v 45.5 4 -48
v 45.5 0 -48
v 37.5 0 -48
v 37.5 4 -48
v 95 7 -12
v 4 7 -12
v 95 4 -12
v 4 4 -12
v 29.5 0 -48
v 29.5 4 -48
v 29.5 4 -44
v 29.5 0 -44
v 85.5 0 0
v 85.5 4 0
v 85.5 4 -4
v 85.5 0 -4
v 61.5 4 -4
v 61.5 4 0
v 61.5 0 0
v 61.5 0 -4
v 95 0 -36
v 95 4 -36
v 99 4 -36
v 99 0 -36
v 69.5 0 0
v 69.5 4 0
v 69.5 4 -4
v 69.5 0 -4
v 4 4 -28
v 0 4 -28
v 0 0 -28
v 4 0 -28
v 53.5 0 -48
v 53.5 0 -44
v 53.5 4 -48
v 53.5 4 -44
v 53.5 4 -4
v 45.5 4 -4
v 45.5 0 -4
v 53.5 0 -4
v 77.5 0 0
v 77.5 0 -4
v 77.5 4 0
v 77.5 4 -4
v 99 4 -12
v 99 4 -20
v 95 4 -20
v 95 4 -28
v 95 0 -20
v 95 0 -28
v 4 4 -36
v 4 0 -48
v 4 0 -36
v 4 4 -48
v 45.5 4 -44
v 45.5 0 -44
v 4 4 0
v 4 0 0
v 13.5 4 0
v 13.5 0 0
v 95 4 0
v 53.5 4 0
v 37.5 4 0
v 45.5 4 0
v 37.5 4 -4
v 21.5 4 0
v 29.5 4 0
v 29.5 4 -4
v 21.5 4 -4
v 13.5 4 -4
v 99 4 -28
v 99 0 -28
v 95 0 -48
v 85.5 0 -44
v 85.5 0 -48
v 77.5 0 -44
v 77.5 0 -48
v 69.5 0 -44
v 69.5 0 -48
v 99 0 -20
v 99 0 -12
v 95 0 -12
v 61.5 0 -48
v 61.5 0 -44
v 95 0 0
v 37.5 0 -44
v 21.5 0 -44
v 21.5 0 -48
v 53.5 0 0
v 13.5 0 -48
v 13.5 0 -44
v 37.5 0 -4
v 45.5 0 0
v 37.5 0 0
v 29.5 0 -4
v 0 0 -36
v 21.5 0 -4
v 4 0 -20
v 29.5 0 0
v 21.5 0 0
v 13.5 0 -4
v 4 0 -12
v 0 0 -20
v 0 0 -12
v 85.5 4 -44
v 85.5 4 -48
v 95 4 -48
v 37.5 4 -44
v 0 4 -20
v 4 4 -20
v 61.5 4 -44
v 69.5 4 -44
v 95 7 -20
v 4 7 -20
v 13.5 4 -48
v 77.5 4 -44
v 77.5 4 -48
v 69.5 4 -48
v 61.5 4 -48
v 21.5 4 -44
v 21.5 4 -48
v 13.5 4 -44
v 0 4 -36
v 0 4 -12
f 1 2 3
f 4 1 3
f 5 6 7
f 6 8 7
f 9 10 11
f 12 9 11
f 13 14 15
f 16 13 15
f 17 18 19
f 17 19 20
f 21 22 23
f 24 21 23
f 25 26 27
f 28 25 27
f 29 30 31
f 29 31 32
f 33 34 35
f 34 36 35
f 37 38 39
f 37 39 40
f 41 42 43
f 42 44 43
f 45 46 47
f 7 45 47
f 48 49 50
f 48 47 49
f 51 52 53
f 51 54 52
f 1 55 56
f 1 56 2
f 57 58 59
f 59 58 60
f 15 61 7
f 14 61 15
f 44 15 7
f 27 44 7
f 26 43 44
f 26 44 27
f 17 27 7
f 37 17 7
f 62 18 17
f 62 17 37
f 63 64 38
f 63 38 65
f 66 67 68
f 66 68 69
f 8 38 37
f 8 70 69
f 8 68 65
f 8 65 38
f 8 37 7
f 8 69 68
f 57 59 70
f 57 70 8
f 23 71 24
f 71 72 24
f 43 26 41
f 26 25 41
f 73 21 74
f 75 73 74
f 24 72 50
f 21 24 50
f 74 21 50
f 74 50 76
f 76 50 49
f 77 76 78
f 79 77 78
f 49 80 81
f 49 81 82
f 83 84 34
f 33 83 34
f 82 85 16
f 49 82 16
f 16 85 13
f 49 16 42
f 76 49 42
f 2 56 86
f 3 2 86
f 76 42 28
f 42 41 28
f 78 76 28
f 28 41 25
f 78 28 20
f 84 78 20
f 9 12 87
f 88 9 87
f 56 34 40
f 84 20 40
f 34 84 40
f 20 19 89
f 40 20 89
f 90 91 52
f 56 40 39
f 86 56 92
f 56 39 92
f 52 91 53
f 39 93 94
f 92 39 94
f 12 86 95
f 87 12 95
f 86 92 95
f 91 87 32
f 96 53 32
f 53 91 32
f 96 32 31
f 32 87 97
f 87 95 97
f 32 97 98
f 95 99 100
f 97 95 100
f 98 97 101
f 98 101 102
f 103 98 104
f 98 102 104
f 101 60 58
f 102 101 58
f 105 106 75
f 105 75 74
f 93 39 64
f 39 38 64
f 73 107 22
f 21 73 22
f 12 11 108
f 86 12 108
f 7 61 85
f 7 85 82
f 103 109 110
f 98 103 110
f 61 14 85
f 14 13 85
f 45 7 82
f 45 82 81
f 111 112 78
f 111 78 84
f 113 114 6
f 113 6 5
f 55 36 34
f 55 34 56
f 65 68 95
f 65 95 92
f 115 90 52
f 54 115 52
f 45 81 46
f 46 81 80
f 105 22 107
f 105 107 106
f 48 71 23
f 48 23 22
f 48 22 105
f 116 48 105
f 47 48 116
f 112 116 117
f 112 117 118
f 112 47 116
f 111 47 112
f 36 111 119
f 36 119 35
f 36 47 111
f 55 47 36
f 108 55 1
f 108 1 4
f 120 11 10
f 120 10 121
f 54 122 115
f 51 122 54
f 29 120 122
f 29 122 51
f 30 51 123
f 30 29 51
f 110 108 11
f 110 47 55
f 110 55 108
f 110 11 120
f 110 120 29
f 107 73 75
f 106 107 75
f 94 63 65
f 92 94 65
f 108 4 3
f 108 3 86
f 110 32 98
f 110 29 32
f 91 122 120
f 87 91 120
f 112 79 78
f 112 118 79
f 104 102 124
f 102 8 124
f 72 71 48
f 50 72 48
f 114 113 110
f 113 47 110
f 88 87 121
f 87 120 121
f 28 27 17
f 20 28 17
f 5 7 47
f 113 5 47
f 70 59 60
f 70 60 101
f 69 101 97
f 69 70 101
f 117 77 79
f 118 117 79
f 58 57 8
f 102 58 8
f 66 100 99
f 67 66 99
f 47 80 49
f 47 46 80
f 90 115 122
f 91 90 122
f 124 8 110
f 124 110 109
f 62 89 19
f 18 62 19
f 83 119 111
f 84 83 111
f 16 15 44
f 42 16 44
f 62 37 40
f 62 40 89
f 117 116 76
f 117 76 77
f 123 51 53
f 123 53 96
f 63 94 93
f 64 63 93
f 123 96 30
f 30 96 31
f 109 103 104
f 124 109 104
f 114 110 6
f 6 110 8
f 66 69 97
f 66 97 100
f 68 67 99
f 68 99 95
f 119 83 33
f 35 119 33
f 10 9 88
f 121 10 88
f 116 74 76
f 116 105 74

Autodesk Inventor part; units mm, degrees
ref_plane "YZ Plane" through (0, 0, 0) normal (1, 0, 0) x (0, 1, 0)
ref_plane "XZ Plane" through (0, 0, 0) normal (0, 1, 0) x (-1, 0, 0)
ref_plane "XY Plane" through (0, 0, 0) normal (0, 0, 1) x (1, 0, 0)
sketch "Sketch1" plane through (0, 0, 0) normal (0, 1, 0) x (-1, 0, 0)
  line L0 (0, 0) -> (-99, 0)
  line L1 (-99, 0) -> (-99, -48)
  line L2 (-99, -48) -> (0, -48)
  line L3 (0, -48) -> (0, 0)
  dimension "d0" = 99
  dimension "d1" = 48
extrude "Extrusion1" add sketch "Sketch1" along normal blind 4
sketch "Sketch2" plane through (0, 4, 0) normal (0, 1, 0) x (1, 0, 0)
  line L0 (99, 48) -> (0, 48) construction
  line L1 (99, 0) -> (99, 48) construction
  line L2 (0, 0) -> (99, 0) construction
  line L3 (0, 48) -> (0, 0) construction
  line L4 (4, 44) -> (95, 44) construction
  line L5 (95, 44) -> (95, 4) construction
  line L6 (95, 4) -> (4, 4) construction
  line L7 (4, 4) -> (4, 44) construction
  line L8 (4, 36) -> (0, 36)
  line L9 (0, 36) -> (0, 48)
  line L10 (0, 48) -> (4, 48)
  line L11 (4, 48) -> (4, 36)
  line L12 (0, 24) -> (99, 24) construction
  line L13 (49.5, 0) -> (49.5, 48) construction
  line L14 (0, 28) -> (4, 28)
  line L15 (0, 28) -> (0, 24)
  line L16 (4, 28) -> (4, 24)
  line L17 (13.5, 48) -> (13.5, 44)
  line L18 (13.5, 44) -> (21.5, 44)
  line L19 (21.5, 44) -> (21.5, 48)
  line L20 (21.5, 48) -> (13.5, 48)
  line L21 (29.5, 48) -> (29.5, 44)
  line L22 (29.5, 44) -> (37.5, 44)
  line L23 (37.5, 48) -> (37.5, 44)
  line L24 (37.5, 48) -> (29.5, 48)
  line L25 (45.5, 44) -> (45.5, 48)
  line L26 (45.5, 44) -> (49.5, 44)
  line L27 (49.5, 48) -> (45.5, 48)
  line L28 (4, 12) -> (0, 12)
  line L29 (0, 12) -> (0, 0)
  line L30 (0, 0) -> (4, 0)
  line L31 (4, 0) -> (4, 12)
  line L32 (0, 20) -> (4, 20)
  line L33 (0, 20) -> (0, 24)
  line L34 (4, 20) -> (4, 24)
  line L35 (13.5, 0) -> (13.5, 4)
  line L36 (13.5, 4) -> (21.5, 4)
  line L37 (21.5, 4) -> (21.5, 0)
  line L38 (21.5, 0) -> (13.5, 0)
  line L39 (29.5, 0) -> (29.5, 4)
  line L40 (29.5, 4) -> (37.5, 4)
  line L41 (37.5, 0) -> (37.5, 4)
  line L42 (37.5, 0) -> (29.5, 0)
  line L43 (45.5, 4) -> (45.5, 0)
  line L44 (45.5, 4) -> (49.5, 4)
  line L45 (49.5, 0) -> (45.5, 0)
  line L46 (99, 48) -> (99, 0) construction
  line L47 (95, 4) -> (95, 44) construction
  line L48 (95, 36) -> (99, 36)
  line L49 (99, 36) -> (99, 48)
  line L50 (99, 48) -> (95, 48)
  line L51 (95, 48) -> (95, 36)
  line L52 (99, 28) -> (95, 28)
  line L53 (99, 28) -> (99, 24)
  line L54 (95, 28) -> (95, 24)
  line L55 (85.5, 48) -> (85.5, 44)
  line L56 (85.5, 44) -> (77.5, 44)
  line L57 (77.5, 44) -> (77.5, 48)
  line L58 (77.5, 48) -> (85.5, 48)
  line L59 (69.5, 48) -> (69.5, 44)
  line L60 (69.5, 44) -> (61.5, 44)
  line L61 (61.5, 48) -> (61.5, 44)
  line L62 (61.5, 48) -> (69.5, 48)
  line L63 (53.5, 44) -> (53.5, 48)
  line L64 (53.5, 44) -> (49.5, 44)
  line L65 (49.5, 48) -> (53.5, 48)
  line L66 (99, 0) -> (95, 0)
  line L67 (69.5, 0) -> (69.5, 4)
  line L68 (69.5, 4) -> (61.5, 4)
  line L69 (61.5, 0) -> (69.5, 0)
  line L70 (61.5, 0) -> (61.5, 4)
  line L71 (53.5, 4) -> (53.5, 0)
  line L72 (53.5, 4) -> (49.5, 4)
  line L73 (49.5, 0) -> (53.5, 0)
  line L74 (95, 0) -> (95, 12)
  line L75 (95, 12) -> (99, 12)
  line L76 (99, 12) -> (99, 0)
  line L77 (85.5, 0) -> (85.5, 4)
  line L78 (99, 20) -> (95, 20)
  line L79 (77.5, 0) -> (85.5, 0)
  line L80 (77.5, 4) -> (77.5, 0)
  line L81 (85.5, 4) -> (77.5, 4)
  line L82 (95, 20) -> (95, 24)
  line L83 (99, 20) -> (99, 24)
  dimension "d8" = 4
  dimension "d11" = 8
  dimension "d12" = 4
  dimension "d14" = 8
  dimension "d15" = 8
  dimension "d16" = 8
  dimension "d17" = 4
  dimension "d18" = 8
extrude "Extrusion2" cut sketch "Sketch2" against normal up to surface (4 mm away)
sketch "Sketch3" plane through (0, 4, 0) normal (0, 1, 0) x (1, 0, 0)
  line L0 (4, 12) -> (4, 0) projected
  line L1 (4, 12) -> (95, 12)
  line L2 (95, 12) -> (95, 20)
  line L3 (95, 20) -> (4, 20)
  line L4 (4, 20) -> (4, 12)
  line L5 (13.5, 4) -> (21.5, 4) projected
  point P0 (0, 0)
  dimension "d21" = 8
  dimension "d22" = 8
extrude "Extrusion3" add sketch "Sketch3" along normal blind 3
properties part number "front" material "PBT Plastic Black"
